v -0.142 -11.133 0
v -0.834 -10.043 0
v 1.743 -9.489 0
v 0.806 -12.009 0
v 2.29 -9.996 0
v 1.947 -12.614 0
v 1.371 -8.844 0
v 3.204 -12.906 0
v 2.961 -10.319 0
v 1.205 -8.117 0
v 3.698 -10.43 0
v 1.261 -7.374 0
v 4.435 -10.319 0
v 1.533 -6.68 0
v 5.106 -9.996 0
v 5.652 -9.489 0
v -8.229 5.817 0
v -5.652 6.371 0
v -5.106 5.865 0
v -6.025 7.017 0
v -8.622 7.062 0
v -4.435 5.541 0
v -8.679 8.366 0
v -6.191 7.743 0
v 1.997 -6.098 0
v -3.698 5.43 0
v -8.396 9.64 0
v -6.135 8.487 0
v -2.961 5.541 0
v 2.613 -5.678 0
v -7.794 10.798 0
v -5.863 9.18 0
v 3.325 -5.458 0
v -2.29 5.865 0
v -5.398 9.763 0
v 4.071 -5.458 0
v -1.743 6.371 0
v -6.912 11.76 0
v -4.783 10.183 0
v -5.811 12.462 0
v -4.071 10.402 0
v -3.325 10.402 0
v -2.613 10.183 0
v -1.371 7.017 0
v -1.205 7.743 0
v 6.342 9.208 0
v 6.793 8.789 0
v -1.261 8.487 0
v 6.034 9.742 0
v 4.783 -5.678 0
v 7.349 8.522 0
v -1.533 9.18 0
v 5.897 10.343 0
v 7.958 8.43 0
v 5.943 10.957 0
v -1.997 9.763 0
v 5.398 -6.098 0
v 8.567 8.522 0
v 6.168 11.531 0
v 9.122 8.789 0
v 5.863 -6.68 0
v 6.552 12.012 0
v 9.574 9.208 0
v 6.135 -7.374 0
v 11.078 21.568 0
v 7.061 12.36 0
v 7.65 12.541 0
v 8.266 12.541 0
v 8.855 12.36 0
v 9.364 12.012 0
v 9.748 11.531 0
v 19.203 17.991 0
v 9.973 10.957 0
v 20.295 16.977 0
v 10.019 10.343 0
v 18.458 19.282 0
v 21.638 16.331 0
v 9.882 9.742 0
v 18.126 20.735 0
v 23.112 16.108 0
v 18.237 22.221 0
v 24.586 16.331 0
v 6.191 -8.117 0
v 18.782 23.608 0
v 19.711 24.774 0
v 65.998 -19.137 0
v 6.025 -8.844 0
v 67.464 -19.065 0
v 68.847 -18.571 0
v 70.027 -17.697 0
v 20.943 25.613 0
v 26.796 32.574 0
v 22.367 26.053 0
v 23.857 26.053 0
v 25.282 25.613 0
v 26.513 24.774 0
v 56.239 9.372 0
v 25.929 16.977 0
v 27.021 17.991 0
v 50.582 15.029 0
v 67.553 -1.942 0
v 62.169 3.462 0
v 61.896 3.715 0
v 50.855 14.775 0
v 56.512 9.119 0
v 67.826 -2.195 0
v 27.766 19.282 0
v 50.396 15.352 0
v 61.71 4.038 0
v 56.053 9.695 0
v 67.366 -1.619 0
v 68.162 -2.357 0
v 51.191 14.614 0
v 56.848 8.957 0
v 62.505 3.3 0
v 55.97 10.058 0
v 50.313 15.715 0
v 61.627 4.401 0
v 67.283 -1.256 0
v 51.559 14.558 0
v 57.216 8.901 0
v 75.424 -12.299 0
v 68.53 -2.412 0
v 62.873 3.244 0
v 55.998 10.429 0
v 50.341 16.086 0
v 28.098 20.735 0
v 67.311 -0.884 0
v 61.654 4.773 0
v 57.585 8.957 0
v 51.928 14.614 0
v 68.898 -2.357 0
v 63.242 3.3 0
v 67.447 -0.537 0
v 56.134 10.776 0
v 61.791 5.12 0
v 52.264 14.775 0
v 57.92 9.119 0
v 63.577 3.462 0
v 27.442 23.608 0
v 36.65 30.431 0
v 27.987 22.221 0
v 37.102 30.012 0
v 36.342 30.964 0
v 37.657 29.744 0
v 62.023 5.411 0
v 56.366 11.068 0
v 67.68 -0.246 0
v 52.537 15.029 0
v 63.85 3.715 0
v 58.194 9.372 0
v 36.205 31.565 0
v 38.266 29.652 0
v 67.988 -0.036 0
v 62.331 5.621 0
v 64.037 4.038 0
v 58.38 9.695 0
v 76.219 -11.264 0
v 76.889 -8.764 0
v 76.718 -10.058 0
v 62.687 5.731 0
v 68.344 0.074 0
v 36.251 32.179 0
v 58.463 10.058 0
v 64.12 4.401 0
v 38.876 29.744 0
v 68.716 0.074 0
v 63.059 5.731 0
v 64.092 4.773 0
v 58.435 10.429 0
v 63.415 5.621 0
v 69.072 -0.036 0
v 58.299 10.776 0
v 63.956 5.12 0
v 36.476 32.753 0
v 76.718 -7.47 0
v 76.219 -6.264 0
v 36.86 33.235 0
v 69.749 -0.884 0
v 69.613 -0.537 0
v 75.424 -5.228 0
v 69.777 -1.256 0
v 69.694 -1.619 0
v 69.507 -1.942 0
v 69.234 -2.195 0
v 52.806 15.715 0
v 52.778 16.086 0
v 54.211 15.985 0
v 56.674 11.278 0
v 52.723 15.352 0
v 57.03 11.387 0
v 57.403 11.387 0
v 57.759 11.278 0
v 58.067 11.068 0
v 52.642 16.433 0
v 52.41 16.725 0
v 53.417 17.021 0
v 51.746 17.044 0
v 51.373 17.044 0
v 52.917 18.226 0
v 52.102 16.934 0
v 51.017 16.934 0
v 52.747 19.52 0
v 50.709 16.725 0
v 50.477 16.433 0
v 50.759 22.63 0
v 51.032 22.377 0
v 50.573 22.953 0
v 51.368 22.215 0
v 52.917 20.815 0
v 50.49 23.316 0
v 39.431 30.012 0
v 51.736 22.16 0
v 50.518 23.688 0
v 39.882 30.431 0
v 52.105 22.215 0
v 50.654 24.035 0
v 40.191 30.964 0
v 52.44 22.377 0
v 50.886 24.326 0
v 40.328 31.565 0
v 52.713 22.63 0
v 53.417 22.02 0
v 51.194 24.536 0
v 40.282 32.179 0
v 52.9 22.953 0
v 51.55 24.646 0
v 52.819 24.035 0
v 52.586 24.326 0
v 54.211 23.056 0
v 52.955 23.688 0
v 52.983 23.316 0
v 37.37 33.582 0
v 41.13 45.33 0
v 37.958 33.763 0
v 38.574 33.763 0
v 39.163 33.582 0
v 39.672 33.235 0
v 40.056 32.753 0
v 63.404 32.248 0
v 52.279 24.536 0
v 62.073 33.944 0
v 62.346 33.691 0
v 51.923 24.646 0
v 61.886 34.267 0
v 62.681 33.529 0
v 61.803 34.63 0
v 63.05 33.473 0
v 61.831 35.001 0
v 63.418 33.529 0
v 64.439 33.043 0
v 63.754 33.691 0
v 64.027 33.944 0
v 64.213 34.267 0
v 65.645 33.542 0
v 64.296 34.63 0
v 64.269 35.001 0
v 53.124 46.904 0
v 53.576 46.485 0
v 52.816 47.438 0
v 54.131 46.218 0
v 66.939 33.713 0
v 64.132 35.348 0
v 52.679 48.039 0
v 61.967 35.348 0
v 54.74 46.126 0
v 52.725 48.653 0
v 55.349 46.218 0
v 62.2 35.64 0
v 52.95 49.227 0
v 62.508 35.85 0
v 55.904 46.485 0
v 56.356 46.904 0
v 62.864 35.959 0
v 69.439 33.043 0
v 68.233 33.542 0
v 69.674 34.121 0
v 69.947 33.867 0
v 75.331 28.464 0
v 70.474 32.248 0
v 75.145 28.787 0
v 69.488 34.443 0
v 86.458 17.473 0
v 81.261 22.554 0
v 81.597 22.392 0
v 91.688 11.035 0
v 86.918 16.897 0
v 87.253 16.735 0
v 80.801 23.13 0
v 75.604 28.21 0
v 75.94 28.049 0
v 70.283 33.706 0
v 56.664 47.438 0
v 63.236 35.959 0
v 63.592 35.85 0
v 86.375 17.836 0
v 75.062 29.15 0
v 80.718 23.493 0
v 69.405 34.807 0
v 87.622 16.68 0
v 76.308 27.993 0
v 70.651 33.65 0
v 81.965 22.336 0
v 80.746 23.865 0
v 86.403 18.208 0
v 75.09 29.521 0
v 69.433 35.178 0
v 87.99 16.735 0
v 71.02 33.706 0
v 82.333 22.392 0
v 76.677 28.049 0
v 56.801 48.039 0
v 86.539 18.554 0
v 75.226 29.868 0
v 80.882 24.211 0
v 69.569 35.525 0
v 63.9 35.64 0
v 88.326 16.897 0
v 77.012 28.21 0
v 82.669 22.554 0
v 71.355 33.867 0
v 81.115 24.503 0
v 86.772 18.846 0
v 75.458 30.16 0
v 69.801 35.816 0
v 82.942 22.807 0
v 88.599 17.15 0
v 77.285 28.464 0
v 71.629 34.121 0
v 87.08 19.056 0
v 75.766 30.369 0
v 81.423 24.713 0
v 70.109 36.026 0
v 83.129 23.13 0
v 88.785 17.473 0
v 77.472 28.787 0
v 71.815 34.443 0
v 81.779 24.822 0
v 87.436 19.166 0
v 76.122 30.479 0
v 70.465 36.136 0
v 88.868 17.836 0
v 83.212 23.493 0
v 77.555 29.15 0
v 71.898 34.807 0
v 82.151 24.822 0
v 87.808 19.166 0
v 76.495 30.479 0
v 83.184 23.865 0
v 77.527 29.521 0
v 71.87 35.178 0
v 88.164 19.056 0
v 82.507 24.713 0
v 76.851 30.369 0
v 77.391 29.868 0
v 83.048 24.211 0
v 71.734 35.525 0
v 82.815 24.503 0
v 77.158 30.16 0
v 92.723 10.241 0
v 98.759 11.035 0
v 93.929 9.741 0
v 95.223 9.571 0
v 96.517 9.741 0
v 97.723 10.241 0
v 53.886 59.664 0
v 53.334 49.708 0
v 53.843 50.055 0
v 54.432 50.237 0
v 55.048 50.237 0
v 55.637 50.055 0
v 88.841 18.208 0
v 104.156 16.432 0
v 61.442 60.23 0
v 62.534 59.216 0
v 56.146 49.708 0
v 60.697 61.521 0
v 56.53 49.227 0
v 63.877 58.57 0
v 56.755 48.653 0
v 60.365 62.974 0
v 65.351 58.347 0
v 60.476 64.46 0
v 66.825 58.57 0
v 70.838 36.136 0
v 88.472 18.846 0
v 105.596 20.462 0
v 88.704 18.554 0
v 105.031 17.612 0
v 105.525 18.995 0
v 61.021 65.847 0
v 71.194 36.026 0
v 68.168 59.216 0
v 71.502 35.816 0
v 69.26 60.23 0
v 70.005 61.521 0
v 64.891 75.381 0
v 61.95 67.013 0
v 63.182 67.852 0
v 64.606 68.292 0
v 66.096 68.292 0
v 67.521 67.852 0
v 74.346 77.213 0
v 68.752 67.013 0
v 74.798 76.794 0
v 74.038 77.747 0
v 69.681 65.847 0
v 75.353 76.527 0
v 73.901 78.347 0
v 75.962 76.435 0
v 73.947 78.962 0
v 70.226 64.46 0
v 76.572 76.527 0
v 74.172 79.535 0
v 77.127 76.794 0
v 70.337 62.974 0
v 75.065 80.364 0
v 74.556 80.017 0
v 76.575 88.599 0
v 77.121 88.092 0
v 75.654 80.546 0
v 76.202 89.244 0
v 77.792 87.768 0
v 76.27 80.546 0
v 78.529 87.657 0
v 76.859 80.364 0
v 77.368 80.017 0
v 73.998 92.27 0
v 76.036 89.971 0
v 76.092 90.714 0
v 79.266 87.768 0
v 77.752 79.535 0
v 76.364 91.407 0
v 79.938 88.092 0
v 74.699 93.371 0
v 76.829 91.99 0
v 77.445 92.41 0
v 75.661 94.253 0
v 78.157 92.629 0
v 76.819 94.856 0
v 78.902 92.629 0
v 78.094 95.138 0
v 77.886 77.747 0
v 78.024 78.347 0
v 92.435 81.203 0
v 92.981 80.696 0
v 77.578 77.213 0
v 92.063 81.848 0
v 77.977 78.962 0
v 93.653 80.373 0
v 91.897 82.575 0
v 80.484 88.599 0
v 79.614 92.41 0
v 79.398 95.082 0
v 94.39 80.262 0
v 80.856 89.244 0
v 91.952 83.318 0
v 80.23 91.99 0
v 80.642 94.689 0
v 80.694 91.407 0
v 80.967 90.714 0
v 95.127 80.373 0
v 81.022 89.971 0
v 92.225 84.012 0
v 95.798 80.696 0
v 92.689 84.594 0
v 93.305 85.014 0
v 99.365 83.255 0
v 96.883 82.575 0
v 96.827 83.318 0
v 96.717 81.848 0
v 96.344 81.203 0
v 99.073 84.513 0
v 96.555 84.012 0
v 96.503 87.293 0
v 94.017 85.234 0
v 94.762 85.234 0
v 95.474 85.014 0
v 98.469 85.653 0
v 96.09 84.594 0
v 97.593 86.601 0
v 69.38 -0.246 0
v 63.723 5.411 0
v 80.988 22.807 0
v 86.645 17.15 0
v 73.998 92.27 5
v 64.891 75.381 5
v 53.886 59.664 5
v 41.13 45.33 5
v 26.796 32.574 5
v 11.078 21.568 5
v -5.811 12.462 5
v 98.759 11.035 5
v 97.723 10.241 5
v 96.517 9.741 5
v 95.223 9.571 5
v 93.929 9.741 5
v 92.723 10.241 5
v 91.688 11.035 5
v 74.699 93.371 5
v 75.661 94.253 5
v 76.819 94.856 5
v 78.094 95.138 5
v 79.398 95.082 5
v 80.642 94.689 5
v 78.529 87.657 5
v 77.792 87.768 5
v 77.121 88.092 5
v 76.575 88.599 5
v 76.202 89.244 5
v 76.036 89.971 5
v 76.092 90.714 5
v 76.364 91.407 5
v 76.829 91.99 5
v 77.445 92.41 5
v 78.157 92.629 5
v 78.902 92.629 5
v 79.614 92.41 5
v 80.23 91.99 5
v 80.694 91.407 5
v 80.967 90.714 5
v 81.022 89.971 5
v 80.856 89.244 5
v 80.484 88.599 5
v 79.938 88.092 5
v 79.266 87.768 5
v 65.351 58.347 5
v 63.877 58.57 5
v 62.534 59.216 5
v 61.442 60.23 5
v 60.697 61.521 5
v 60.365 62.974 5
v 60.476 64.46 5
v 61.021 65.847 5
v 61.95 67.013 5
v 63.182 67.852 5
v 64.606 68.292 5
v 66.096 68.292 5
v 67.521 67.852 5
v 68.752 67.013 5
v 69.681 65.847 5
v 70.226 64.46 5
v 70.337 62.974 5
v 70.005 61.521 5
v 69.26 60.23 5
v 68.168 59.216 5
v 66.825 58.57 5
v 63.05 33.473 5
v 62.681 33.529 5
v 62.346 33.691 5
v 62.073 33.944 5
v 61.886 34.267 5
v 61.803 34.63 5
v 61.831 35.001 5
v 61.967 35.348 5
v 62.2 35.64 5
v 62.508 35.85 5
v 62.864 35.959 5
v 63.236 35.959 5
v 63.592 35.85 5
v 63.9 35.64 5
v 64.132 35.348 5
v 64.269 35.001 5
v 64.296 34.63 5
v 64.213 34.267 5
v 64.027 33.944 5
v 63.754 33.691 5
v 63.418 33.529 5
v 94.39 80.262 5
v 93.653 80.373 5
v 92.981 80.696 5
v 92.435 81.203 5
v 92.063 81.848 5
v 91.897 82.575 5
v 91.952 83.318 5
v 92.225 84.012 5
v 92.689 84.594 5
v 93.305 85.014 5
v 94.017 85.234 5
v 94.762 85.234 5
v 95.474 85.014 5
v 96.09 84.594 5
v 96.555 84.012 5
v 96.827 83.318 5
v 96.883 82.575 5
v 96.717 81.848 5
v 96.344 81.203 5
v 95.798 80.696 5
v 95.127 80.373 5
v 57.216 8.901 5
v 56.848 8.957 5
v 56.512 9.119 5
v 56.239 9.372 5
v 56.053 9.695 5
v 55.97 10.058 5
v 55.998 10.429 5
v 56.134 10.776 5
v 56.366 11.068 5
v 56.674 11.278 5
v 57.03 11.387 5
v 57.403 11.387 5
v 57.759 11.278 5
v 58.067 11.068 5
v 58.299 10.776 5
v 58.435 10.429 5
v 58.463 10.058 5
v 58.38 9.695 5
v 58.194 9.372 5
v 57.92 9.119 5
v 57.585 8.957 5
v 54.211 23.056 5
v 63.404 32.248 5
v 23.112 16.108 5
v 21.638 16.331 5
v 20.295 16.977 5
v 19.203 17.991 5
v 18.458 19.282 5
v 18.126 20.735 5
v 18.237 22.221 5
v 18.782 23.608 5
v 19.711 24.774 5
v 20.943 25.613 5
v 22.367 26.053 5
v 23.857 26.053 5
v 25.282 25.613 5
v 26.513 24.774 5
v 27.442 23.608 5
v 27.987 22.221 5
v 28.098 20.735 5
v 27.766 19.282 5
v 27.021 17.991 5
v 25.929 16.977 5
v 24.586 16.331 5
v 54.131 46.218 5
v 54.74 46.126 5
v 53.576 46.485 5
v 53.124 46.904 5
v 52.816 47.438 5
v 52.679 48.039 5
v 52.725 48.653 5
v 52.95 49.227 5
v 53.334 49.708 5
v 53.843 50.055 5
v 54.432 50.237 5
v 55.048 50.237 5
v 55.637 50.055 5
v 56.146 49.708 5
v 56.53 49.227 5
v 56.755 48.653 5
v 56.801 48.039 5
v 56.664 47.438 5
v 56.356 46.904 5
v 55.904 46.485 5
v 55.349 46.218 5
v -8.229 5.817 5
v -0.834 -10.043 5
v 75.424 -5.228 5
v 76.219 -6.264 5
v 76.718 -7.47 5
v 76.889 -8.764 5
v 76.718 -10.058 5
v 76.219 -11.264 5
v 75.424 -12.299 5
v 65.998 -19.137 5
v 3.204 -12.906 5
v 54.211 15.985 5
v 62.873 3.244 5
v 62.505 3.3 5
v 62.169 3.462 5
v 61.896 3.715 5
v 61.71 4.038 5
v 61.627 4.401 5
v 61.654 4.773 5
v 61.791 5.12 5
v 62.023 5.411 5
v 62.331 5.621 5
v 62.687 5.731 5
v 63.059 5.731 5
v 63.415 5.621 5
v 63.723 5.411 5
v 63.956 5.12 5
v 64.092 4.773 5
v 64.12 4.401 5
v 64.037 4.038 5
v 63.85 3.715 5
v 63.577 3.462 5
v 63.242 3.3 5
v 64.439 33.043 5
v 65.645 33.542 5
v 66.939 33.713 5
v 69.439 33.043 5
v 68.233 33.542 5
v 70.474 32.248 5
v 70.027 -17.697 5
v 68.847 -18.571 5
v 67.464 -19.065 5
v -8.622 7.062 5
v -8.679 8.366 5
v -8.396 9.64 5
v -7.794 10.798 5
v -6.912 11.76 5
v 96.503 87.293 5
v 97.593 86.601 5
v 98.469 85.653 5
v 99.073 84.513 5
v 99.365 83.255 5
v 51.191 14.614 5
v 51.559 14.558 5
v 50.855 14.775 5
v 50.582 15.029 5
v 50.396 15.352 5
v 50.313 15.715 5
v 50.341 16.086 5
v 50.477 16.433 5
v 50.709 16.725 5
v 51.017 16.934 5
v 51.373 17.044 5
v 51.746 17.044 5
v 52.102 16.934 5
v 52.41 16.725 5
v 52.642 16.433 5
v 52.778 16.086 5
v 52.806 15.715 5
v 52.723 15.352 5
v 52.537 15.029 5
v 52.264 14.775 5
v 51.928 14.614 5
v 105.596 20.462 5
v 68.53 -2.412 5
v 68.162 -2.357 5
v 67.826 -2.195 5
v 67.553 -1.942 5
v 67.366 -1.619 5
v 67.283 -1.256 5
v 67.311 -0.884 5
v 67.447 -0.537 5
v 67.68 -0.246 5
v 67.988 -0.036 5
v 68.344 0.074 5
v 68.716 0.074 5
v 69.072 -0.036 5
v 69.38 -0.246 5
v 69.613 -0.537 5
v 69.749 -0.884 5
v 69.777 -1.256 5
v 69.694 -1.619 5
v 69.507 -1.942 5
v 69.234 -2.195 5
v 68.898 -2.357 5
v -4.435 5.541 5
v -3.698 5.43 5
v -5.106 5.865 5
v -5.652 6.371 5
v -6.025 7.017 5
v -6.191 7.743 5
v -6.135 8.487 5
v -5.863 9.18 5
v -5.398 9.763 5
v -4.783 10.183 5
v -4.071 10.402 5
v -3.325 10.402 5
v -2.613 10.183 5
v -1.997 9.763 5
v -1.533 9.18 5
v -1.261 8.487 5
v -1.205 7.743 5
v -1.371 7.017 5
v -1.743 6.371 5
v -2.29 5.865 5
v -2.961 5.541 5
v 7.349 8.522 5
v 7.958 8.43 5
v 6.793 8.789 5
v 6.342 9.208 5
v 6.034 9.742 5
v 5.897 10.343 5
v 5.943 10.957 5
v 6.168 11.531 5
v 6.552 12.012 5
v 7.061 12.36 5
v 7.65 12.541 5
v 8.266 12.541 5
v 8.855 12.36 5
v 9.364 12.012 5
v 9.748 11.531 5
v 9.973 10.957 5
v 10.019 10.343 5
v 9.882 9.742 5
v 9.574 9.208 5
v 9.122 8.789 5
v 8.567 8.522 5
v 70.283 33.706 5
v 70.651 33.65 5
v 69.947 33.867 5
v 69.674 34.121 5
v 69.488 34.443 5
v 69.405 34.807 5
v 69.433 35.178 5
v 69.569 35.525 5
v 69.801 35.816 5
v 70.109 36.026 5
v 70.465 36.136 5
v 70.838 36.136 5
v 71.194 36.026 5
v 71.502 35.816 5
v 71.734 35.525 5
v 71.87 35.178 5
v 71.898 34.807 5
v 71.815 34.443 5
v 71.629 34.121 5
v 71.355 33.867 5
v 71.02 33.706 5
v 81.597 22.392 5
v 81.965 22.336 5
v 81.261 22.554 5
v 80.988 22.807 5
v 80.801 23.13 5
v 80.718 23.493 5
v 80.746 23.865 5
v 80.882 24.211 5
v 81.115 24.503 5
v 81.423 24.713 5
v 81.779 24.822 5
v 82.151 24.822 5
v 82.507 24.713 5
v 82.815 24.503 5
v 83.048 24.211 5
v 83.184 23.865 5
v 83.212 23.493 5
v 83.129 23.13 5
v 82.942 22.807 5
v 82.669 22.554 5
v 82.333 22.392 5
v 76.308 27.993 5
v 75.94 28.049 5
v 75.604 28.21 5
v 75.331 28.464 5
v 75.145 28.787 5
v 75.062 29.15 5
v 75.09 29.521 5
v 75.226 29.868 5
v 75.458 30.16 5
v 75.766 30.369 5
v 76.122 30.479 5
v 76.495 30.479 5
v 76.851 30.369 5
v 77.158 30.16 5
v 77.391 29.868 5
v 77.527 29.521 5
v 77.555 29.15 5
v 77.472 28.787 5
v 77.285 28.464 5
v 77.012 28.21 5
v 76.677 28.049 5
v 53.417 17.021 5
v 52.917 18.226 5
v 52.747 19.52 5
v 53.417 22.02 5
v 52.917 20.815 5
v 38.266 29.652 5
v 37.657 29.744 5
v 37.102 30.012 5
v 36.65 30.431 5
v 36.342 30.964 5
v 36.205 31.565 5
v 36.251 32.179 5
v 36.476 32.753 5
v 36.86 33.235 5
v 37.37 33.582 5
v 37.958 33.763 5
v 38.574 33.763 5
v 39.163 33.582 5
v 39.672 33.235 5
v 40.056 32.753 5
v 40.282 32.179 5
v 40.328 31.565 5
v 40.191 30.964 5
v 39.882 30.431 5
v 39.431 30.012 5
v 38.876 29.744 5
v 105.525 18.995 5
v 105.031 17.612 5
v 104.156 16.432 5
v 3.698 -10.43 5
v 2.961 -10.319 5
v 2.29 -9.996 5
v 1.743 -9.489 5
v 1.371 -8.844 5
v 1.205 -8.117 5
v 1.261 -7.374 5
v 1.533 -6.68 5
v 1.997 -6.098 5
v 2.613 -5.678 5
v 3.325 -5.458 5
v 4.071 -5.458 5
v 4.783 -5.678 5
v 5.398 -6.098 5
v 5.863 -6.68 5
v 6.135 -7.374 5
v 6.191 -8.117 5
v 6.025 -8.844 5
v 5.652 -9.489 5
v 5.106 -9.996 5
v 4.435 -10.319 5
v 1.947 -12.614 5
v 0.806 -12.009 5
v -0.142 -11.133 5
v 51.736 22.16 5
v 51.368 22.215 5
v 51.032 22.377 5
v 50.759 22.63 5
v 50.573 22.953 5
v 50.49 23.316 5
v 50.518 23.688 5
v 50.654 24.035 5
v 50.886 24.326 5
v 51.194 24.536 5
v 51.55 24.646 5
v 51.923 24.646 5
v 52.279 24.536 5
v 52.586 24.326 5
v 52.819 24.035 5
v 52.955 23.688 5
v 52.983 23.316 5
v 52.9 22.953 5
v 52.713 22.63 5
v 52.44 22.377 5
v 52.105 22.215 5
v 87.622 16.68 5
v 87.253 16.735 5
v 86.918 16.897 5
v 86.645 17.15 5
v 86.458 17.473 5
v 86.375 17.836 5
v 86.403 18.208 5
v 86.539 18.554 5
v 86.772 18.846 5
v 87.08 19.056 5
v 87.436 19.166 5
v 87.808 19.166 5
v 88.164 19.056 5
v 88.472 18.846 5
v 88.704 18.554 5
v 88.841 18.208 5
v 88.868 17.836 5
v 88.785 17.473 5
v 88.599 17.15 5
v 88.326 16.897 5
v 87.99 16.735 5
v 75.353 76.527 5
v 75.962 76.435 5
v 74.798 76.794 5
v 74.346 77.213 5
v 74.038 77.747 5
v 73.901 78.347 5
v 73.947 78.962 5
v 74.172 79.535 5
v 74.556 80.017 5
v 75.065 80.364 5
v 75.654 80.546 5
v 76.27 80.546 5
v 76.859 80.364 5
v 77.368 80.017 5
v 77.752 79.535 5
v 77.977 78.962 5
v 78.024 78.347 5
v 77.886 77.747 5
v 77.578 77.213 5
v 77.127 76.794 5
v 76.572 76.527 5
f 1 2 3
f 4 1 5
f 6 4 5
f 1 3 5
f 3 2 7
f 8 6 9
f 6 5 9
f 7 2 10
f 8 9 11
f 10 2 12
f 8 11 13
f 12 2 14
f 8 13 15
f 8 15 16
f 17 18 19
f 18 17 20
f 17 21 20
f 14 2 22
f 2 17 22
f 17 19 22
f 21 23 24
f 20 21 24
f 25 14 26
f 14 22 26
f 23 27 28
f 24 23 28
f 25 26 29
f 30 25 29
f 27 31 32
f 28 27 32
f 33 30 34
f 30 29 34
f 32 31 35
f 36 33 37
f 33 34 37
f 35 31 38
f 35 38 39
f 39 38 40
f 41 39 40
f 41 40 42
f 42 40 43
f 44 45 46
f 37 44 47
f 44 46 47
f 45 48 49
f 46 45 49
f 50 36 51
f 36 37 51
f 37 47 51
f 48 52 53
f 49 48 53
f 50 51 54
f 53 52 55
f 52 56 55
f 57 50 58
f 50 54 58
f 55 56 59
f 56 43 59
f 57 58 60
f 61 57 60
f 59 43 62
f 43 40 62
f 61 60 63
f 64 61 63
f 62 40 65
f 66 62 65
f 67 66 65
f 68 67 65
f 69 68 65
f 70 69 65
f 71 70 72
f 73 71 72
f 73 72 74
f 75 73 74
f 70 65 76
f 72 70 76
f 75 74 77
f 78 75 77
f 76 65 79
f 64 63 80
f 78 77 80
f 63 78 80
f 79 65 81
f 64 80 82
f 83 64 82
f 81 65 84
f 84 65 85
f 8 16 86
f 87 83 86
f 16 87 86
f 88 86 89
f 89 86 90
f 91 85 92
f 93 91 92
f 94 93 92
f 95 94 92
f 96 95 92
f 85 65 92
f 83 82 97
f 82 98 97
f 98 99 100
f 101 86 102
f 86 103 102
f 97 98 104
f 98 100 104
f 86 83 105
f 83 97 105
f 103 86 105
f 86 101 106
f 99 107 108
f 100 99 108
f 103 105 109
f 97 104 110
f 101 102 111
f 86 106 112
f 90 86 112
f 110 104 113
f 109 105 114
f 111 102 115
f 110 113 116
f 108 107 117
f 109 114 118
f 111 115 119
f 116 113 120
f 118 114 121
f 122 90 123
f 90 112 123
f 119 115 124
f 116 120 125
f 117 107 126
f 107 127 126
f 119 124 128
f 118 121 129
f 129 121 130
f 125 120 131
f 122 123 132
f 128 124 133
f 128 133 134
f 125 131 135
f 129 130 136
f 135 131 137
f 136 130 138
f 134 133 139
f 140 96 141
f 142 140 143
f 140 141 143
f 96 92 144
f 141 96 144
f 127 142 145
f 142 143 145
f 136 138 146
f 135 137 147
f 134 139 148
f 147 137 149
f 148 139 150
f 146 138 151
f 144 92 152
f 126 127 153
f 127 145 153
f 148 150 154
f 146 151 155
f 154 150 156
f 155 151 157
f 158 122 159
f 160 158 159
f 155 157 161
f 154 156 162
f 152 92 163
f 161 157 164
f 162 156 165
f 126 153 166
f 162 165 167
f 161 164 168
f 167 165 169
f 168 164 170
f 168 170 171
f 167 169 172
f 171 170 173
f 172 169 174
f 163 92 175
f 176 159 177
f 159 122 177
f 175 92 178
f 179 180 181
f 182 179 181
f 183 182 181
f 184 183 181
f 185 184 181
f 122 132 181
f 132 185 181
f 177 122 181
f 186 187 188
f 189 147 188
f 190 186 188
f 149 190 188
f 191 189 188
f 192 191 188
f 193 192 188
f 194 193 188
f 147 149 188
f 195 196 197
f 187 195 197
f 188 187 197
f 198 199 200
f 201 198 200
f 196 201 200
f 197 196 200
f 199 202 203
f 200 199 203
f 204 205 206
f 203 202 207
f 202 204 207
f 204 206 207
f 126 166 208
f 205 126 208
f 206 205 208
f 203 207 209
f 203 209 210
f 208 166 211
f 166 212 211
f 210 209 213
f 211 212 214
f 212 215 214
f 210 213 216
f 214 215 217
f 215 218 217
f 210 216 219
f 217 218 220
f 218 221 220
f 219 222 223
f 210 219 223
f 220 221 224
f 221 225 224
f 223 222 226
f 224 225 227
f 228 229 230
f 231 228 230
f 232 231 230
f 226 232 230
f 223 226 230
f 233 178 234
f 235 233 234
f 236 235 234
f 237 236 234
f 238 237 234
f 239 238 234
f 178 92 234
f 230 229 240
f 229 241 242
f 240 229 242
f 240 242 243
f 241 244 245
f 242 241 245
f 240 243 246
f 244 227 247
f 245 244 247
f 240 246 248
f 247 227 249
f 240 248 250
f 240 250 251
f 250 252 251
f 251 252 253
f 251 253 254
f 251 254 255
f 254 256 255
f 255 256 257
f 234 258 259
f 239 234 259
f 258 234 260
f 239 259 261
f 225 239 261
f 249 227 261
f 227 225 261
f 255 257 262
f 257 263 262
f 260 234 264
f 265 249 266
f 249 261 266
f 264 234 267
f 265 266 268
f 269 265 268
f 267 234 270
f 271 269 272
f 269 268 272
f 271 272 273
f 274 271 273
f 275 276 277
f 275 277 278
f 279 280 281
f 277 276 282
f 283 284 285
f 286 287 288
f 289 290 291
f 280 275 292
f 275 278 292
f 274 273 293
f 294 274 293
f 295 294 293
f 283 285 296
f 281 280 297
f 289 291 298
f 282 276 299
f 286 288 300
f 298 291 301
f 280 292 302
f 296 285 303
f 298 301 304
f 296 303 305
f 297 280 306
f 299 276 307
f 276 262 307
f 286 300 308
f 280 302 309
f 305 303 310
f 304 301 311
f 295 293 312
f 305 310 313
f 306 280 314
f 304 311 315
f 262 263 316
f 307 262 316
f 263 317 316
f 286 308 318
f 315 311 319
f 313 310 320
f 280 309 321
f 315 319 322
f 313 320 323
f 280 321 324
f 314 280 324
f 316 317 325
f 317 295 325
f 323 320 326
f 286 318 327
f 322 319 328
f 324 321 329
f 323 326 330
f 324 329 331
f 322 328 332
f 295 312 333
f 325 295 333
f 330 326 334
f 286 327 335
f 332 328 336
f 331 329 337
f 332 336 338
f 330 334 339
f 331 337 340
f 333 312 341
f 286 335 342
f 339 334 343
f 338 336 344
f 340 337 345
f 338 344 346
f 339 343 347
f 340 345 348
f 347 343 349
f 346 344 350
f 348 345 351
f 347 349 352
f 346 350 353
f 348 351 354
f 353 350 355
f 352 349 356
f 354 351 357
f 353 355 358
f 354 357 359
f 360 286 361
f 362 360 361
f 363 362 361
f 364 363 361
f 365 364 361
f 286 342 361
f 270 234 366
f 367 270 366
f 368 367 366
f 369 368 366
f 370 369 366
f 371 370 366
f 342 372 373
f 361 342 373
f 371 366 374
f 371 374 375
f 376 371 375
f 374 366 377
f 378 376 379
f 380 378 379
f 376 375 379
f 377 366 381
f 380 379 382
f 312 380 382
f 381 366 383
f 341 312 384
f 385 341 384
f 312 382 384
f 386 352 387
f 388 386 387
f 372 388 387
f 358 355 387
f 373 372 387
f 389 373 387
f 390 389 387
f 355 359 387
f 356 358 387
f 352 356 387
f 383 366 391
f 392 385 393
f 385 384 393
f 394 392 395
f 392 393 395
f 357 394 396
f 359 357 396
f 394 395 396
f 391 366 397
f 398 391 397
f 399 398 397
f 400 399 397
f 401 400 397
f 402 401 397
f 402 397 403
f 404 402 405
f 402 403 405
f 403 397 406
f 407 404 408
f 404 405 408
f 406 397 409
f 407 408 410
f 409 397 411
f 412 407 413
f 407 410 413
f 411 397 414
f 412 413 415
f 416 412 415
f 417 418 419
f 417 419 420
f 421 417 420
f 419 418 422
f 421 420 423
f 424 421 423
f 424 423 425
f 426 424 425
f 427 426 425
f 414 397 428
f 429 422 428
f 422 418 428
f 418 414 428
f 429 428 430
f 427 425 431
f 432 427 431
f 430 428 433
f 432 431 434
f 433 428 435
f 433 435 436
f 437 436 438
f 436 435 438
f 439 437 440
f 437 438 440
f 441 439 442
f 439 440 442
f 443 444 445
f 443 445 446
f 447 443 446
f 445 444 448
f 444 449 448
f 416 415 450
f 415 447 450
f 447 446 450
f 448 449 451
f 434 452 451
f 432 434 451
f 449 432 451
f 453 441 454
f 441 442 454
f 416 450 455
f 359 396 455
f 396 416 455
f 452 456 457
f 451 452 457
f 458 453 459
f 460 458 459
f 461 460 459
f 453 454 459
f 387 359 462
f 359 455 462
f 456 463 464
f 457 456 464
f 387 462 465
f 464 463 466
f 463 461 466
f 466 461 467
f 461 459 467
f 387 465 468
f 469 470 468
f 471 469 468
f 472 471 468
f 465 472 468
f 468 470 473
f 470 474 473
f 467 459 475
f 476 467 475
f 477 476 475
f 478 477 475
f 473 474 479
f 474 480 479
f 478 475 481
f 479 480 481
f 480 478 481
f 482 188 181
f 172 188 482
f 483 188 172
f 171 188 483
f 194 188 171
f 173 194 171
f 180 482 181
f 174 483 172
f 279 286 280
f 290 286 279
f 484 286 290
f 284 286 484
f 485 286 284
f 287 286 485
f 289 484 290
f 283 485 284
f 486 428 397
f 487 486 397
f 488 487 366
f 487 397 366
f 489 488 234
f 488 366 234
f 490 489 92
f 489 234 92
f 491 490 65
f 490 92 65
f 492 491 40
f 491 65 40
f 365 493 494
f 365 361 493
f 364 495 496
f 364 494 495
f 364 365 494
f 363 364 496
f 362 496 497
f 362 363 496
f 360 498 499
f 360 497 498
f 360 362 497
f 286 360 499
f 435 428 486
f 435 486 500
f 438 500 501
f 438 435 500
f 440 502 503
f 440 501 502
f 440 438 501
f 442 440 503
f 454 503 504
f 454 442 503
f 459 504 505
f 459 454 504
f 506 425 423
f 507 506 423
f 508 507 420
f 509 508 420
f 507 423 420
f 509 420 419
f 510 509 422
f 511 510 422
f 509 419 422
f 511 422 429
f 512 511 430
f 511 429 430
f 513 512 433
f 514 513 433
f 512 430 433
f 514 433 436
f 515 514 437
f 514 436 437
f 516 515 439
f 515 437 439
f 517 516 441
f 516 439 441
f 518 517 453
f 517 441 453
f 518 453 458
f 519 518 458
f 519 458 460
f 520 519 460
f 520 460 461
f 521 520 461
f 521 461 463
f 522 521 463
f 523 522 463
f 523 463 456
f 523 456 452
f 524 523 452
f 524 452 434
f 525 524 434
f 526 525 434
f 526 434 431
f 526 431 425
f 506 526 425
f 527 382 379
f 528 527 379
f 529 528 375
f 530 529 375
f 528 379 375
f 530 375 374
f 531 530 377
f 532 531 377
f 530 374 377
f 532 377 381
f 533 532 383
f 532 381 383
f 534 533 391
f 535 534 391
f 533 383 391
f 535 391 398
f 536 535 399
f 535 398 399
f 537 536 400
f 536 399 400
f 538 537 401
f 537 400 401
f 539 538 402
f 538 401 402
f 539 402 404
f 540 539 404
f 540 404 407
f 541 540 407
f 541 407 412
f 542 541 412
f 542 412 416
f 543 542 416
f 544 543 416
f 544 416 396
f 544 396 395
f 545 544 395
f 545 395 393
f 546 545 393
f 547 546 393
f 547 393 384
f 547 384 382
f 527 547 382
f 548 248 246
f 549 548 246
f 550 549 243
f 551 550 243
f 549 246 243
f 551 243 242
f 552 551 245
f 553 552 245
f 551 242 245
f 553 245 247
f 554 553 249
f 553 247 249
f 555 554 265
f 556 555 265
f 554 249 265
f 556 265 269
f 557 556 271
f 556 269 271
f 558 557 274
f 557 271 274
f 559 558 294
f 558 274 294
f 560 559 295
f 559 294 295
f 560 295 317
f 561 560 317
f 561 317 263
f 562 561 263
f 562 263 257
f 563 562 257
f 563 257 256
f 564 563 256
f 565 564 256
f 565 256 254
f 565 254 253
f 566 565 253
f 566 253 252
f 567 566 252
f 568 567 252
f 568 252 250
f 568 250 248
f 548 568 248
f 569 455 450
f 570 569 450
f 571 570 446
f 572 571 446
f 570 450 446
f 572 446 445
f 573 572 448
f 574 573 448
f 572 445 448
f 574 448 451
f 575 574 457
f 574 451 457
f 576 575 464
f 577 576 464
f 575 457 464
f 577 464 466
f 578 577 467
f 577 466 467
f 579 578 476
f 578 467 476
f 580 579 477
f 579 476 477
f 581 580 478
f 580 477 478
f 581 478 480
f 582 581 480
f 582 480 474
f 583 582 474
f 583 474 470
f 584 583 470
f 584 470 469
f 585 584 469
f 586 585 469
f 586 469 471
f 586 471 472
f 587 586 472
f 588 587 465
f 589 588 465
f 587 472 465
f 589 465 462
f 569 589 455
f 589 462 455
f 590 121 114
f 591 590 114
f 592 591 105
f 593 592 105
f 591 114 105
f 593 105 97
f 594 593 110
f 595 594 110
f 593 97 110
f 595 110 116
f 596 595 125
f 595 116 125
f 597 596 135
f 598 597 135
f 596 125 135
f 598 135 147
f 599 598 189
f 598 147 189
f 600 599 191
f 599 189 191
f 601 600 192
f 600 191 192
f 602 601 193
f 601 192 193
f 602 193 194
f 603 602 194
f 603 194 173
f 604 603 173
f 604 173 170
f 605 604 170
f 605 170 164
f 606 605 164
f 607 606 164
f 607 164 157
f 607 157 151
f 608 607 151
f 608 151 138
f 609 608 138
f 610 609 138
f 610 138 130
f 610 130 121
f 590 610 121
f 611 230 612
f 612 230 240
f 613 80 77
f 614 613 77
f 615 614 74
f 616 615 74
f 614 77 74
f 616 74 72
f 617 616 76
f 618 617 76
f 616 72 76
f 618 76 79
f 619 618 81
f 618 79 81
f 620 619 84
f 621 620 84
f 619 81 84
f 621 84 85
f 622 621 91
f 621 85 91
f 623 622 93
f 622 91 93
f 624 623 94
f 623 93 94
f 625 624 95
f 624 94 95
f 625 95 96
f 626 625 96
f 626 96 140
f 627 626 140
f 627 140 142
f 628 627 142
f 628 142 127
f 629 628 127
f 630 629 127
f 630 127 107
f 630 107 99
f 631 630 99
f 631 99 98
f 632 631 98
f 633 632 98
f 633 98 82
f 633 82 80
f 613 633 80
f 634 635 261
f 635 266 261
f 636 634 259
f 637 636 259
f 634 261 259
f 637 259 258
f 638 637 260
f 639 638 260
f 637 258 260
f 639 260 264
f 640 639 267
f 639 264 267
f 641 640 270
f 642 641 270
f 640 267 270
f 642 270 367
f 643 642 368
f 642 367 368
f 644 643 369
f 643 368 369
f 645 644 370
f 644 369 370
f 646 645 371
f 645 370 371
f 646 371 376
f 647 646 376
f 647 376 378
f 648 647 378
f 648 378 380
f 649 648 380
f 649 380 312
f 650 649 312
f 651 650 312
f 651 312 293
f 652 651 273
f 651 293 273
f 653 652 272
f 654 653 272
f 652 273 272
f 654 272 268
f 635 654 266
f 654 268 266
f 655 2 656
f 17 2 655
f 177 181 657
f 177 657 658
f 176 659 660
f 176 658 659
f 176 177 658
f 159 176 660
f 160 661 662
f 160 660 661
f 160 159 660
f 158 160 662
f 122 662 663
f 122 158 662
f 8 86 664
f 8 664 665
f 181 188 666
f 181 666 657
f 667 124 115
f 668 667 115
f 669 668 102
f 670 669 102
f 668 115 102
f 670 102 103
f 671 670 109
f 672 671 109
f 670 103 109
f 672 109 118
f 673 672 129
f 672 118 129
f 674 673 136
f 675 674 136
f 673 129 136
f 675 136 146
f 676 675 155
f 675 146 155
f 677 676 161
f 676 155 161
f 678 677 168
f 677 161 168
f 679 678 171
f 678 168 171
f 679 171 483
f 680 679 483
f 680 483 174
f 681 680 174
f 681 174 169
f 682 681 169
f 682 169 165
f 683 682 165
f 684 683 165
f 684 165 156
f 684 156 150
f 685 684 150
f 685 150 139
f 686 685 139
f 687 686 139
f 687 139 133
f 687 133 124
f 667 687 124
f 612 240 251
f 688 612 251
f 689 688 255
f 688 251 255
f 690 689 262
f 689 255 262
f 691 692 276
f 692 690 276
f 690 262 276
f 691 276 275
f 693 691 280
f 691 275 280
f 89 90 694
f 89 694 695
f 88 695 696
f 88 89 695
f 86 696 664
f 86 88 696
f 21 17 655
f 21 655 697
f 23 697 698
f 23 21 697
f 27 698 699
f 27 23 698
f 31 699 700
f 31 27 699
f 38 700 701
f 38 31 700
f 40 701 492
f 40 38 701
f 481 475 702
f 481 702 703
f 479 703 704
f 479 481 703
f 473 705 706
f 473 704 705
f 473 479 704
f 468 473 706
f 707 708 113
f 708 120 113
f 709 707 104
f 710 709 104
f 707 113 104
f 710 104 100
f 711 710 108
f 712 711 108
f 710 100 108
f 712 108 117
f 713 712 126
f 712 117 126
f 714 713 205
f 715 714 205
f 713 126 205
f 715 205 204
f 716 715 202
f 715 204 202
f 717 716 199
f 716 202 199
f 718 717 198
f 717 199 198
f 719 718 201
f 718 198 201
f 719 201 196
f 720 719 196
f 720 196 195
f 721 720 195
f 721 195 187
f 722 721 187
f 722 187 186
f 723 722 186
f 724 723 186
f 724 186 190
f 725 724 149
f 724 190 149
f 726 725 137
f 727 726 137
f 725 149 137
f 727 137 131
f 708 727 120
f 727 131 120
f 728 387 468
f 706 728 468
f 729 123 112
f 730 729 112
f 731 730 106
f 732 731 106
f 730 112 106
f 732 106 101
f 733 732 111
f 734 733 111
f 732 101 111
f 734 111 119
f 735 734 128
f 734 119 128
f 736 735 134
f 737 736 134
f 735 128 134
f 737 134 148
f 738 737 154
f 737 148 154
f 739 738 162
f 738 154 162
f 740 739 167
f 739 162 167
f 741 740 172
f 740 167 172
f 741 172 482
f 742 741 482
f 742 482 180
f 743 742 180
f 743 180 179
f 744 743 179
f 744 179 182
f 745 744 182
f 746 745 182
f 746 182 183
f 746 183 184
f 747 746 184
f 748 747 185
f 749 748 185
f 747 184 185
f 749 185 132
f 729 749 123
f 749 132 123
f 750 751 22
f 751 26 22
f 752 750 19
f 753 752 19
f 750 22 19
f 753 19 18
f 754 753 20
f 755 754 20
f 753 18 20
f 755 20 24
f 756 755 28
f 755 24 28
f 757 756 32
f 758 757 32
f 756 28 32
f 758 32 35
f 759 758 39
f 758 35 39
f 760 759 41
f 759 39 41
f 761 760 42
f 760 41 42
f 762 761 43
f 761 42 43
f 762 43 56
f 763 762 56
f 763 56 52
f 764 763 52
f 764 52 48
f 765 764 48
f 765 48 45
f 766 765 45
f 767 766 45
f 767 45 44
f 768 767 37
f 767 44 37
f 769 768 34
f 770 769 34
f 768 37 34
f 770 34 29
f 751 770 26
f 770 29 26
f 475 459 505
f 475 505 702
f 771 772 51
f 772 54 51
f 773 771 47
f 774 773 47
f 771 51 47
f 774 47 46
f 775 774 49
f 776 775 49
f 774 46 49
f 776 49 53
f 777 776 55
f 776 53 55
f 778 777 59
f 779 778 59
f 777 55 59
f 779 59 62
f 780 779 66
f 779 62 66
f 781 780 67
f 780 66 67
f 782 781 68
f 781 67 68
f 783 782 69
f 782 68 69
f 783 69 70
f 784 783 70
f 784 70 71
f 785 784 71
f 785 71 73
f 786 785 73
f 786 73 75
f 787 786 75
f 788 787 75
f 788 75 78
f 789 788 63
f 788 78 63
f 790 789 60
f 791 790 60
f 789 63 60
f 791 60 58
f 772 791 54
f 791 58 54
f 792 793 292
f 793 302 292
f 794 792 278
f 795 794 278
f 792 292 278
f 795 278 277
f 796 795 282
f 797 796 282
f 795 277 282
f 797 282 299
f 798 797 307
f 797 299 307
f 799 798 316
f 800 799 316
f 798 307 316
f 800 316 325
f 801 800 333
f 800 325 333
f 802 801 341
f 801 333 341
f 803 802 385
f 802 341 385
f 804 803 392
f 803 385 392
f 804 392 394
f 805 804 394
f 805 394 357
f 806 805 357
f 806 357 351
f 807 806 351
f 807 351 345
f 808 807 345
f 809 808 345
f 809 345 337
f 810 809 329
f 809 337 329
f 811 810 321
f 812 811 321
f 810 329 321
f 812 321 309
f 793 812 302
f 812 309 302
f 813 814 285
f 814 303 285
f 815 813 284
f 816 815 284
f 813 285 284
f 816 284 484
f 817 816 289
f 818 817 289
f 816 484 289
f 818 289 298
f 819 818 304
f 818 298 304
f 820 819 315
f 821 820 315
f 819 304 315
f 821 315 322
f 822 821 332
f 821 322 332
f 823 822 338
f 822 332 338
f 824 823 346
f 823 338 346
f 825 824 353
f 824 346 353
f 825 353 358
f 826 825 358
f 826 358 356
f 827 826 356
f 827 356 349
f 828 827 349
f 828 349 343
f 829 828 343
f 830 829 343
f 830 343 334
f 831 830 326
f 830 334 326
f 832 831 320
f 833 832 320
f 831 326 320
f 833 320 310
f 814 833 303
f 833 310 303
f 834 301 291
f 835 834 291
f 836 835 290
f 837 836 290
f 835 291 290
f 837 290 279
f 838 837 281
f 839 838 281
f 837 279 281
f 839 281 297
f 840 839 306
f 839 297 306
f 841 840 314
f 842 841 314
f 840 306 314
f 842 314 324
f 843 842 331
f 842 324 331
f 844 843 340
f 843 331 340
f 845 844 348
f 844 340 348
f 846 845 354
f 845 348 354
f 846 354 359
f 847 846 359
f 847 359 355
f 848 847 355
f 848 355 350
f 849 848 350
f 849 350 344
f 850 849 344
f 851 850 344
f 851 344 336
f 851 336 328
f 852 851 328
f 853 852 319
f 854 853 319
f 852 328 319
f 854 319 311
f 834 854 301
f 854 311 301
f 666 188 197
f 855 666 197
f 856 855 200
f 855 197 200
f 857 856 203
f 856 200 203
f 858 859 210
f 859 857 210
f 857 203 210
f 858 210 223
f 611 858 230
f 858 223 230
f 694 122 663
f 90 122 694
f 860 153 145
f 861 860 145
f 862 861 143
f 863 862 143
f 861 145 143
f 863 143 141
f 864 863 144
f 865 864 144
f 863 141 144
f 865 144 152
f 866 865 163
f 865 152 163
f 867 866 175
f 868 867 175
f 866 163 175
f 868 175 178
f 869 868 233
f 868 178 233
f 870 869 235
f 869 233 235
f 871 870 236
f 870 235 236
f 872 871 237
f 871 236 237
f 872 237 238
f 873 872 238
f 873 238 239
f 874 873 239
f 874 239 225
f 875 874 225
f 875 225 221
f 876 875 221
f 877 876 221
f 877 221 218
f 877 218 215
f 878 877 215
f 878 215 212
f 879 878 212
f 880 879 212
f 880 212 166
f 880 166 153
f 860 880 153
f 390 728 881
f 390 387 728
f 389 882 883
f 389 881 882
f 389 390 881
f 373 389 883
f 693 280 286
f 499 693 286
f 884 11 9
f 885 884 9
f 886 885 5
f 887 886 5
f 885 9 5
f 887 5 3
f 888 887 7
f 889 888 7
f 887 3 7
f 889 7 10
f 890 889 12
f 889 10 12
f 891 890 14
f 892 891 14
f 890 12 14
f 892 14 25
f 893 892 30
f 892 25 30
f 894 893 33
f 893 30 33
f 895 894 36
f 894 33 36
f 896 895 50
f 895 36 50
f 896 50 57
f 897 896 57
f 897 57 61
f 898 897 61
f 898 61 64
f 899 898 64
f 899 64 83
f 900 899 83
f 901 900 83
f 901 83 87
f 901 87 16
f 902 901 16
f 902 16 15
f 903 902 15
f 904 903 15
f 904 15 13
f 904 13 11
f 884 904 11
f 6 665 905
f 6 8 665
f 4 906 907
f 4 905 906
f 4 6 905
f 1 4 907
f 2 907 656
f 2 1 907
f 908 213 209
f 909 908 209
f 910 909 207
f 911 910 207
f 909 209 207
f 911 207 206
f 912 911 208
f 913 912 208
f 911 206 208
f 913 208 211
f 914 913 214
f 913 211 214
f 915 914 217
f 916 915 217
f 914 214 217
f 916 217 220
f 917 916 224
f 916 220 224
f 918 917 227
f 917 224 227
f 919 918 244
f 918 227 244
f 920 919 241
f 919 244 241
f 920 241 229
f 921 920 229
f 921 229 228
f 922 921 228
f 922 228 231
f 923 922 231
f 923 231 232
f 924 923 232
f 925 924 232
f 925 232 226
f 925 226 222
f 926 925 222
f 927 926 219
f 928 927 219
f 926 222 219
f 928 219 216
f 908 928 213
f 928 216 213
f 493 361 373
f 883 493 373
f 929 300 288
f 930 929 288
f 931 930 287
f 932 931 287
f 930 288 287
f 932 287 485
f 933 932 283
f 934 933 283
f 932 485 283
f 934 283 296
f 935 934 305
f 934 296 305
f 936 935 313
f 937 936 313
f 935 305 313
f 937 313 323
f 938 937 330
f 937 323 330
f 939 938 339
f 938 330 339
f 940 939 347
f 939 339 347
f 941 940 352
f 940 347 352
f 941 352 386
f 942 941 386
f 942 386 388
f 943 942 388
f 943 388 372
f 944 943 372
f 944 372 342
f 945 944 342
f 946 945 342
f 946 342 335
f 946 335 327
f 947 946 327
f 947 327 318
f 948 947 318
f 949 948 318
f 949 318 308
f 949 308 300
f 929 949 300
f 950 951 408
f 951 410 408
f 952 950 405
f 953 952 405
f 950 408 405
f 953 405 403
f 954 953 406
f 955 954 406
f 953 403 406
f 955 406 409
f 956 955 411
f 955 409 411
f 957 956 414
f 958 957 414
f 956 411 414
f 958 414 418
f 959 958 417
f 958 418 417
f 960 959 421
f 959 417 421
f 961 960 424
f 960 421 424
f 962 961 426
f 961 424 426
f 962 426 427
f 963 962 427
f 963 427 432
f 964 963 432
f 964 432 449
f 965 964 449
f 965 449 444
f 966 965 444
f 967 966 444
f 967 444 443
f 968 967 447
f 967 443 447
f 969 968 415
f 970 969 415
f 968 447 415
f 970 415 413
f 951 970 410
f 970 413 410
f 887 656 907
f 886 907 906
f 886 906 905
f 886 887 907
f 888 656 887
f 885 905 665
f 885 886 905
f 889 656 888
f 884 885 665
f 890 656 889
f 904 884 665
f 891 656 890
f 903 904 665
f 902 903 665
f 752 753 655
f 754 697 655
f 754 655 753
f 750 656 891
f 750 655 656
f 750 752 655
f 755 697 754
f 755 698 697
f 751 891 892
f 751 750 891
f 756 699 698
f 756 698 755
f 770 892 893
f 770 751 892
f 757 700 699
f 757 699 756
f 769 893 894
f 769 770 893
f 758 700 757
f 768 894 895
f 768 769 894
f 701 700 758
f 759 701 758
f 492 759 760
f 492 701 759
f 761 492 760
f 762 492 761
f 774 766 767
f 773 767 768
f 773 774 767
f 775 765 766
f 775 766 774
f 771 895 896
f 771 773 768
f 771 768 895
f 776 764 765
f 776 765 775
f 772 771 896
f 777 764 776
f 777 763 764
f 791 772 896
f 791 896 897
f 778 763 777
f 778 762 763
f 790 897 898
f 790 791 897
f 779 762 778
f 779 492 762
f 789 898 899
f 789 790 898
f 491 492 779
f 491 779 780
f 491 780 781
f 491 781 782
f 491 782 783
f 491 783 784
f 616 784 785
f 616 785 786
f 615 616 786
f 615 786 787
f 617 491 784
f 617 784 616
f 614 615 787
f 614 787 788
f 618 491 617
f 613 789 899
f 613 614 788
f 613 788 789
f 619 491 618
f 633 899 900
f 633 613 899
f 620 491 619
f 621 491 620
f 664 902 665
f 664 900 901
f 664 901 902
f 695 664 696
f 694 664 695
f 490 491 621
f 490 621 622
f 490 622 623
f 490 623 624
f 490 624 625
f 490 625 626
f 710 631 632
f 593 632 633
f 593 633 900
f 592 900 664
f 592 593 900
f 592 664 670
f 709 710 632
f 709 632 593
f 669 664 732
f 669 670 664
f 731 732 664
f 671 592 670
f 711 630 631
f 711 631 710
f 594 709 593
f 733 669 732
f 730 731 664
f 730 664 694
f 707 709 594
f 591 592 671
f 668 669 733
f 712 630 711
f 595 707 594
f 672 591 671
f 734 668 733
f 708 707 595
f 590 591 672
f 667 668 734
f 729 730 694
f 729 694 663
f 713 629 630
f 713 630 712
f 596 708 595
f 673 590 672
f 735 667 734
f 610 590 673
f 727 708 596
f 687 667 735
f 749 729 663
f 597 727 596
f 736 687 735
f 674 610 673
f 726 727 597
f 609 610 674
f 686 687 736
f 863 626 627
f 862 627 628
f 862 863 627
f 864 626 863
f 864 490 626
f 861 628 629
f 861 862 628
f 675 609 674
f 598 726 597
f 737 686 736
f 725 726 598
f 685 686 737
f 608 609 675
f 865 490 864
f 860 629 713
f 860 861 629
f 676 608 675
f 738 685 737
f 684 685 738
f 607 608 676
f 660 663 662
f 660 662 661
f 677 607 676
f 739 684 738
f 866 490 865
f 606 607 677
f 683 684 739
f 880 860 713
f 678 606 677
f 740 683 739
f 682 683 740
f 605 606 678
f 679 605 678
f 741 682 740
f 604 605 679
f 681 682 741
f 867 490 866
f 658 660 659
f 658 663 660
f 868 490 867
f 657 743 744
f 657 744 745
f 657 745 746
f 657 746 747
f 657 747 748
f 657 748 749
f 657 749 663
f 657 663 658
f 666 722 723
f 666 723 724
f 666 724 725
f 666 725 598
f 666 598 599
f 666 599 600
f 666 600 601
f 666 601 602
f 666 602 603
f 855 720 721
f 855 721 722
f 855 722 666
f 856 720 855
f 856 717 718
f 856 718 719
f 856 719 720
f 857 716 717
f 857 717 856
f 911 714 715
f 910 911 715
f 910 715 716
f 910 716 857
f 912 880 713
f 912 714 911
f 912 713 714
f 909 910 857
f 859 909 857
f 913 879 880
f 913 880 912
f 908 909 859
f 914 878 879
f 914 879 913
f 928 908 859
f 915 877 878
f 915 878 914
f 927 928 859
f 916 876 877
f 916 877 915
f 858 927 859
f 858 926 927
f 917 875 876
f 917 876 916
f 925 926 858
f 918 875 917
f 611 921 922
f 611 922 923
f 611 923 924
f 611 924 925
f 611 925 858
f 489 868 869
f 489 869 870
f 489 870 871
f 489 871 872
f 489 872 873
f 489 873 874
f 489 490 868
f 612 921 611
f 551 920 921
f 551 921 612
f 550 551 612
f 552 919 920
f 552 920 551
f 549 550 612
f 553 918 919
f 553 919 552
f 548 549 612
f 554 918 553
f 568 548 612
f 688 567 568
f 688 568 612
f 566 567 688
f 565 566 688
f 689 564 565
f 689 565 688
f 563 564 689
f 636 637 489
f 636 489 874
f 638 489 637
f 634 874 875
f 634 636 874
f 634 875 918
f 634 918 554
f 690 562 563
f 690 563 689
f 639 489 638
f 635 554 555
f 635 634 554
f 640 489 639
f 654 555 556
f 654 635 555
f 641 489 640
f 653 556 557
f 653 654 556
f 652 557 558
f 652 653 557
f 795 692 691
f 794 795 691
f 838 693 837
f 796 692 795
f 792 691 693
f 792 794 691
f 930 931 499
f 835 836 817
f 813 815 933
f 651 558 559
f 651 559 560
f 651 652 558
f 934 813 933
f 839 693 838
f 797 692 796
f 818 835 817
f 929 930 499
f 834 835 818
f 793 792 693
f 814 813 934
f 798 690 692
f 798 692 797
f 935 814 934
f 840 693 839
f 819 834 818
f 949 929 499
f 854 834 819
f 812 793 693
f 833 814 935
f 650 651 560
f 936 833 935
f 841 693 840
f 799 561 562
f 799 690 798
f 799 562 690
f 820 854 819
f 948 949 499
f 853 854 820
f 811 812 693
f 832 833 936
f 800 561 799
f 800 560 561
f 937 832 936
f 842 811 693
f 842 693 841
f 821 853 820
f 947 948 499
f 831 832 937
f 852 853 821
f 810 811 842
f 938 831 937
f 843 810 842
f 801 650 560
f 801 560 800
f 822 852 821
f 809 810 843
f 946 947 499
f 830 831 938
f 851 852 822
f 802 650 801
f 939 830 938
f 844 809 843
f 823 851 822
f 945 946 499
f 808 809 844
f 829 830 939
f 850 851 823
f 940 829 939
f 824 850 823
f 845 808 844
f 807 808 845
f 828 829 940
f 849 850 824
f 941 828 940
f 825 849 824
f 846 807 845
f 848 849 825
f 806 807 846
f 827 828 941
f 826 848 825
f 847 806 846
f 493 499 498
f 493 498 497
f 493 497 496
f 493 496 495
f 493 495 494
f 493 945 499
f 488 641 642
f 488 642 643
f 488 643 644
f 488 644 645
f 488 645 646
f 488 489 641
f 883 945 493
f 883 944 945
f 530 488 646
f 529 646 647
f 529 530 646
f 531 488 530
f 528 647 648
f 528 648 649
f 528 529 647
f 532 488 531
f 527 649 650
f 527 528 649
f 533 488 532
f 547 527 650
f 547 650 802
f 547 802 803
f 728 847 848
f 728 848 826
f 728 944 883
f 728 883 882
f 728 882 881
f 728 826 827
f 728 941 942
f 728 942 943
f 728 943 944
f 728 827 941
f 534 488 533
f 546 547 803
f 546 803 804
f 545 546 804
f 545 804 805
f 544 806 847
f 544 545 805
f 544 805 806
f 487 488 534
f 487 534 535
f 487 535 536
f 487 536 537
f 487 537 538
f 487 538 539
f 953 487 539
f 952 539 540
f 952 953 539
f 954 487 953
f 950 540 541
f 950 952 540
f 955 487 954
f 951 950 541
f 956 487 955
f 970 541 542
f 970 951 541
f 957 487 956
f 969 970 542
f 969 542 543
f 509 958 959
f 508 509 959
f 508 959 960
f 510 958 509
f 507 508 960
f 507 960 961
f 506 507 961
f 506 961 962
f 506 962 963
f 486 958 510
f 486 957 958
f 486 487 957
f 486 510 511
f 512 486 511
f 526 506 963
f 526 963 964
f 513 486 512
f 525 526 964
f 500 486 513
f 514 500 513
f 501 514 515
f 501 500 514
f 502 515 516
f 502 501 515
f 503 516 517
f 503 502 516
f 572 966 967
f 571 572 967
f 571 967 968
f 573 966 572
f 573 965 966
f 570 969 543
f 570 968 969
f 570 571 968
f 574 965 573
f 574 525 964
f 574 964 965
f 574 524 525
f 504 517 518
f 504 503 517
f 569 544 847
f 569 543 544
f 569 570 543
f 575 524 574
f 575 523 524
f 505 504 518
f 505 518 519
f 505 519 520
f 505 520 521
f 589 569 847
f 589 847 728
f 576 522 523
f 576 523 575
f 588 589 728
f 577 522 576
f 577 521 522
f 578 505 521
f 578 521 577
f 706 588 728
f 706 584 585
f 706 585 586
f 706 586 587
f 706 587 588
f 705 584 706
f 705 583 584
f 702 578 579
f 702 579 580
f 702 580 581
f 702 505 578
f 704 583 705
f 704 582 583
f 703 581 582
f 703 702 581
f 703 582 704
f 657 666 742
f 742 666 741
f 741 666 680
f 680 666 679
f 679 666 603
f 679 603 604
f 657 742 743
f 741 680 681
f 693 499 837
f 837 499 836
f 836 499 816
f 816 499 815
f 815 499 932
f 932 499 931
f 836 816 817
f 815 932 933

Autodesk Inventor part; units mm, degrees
ref_plane "YZ Plane" through (0, 0, 0) normal (1, 0, 0) x (0, 1, 0)
ref_plane "XZ Plane" through (0, 0, 0) normal (0, 1, 0) x (-1, 0, 0)
ref_plane "XY Plane" through (0, 0, 0) normal (0, 0, 1) x (1, 0, 0)
sketch "Sketch1" plane through (0, 0, 0) normal (0, 0, 1) x (1, 0, 0)
  circle A0 centre (-3.6979, 7.9302) radius 2.5 construction
  circle A1 centre (3.6979, -7.9302) radius 2.5 construction
  line L0 (-8.2294, 5.8171) -> (-0.8336, -10.0433) construction
  arc A2 (-0.8336, -10.0433) -> (8.2294, -5.8171) centre (3.6979, -7.9302) ccw construction
  line L1 (8.2294, -5.8171) -> (0.8336, 10.0433) construction
  arc A3 (0.8336, 10.0433) -> (-8.2294, 5.8171) centre (-3.6979, 7.9302) ccw construction
  circle A4 centre (78.5293, 90.1574) radius 2.5 construction
  circle A5 centre (94.3897, 82.7616) radius 2.5 construction
  line L2 (76.4162, 85.6259) -> (92.2766, 78.2301) construction
  arc A6 (92.2766, 78.2301) -> (96.5028, 87.2931) centre (94.3897, 82.7616) ccw construction
  line L3 (96.5028, 87.2931) -> (80.6424, 94.689) construction
  arc A7 (80.6424, 94.689) -> (76.4162, 85.6259) centre (78.5293, 90.1574) ccw construction
  circle A8 centre (-75.543, 162.0025) radius 75 construction
  line L4 (112.457, 50.5739) -> (112.457, -27.9975) construction
  line L5 (107.457, -32.9975) -> (39.927, -32.9975) construction
  line L6 (-75.543, 162.0025) -> (58.8073, 27.6522) construction
  line L7 (54.2111, 23.056) -> (63.4035, 32.2484)
  line L8 (70.4745, 32.2484) -> (91.6877, 11.0352)
  line L9 (54.2111, 15.985) -> (75.4243, -5.2282)
  line L10 (75.4243, -12.2993) -> (70.027, -17.6966)
  line L11 (98.7588, 11.0352) -> (104.1561, 16.4325)
  line L12 (-0.8336, -10.0433) -> (-8.2294, 5.8171)
  line L13 (80.6424, 94.689) -> (96.5028, 87.2931)
  arc A9 (-5.811, 12.4617) -> (73.9978, 92.2705) centre (-75.543, 162.0025) ccw
  line L14 (-3.6979, 7.9302) -> (3.6979, -7.9302) construction
  line L15 (78.5293, 90.1574) -> (94.3897, 82.7616) construction
  line L16 (65.9977, -19.1366) -> (3.2042, -12.9058)
  line L17 (105.5961, 20.4618) -> (99.3653, 83.2553)
  arc A10 (75.4243, -12.2993) -> (75.4243, -5.2282) centre (71.8887, -8.7638) ccw
  arc A11 (54.2111, 23.056) -> (54.2111, 15.985) centre (57.7466, 19.5205) ccw
  arc A12 (70.4745, 32.2484) -> (63.4035, 32.2484) centre (66.939, 28.7129) ccw
  arc A13 (91.6877, 11.0352) -> (98.7588, 11.0352) centre (95.2233, 14.5708) ccw
  arc A14 (104.1561, 16.4325) -> (105.5961, 20.4618) centre (100.6206, 19.9681) ccw
  arc A15 (99.3653, 83.2553) -> (96.5028, 87.2931) centre (94.3897, 82.7616) ccw
  arc A16 (80.6424, 94.689) -> (73.9978, 92.2705) centre (78.5293, 90.1574) ccw
  arc A17 (-5.811, 12.4617) -> (-8.2294, 5.8171) centre (-3.6979, 7.9302) ccw
  arc A18 (-0.8336, -10.0433) -> (3.2042, -12.9058) centre (3.6979, -7.9302) ccw
  arc A19 (65.9977, -19.1366) -> (70.027, -17.6966) centre (66.4914, -14.1611) ccw
  point P0 (0, 0)
  point P1 (79.4008, -9.1758)
  point P2 (50.6755, 19.5205)
  point P3 (66.939, 35.784)
  point P4 (95.2233, 7.4997)
  point P5 (78.9598, -8.7638)
  point P6 (68.3532, -19.3704)
  point P7 (105.8299, 18.1063)
  point P8 (0.37, -12.6245)
  point P9 (76.0422, 96.8341)
  point P10 (99.084, 86.0895)
  point P11 (-10.3746, 10.4173)
  point P12 (-4.5315, -2.1131)
  point P13 (88.5726, 90.991)
  dimension "d56" = 190
  dimension "d64" = 23
  dimension "d65" = 40
  dimension "d67" = 165
  dimension "d68" = 15
  dimension "d69" = 15
  dimension "d70" = 20
  dimension "d73" = 5
extrude "Extrusion1" add sketch "Sketch1" along normal blind 5
sketch "Sketch2" plane through (0, 0, 5) normal (0, 0, 1) x (1, 0, 0)
  circle A0 centre (3.6979, -7.9302) radius 2.067 projected
  circle A1 centre (-3.6979, 7.9302) radius 2.067 projected
  circle A2 centre (94.3897, 82.7616) radius 2.067 projected
  circle A3 centre (78.5293, 90.1574) radius 2.067 projected
  point P0 (0, 0)
hole "Hole1" at (78.5293, 90.1574, 5) at (94.3897, 82.7616, 5) at (-3.6979, 7.9302, 5) at (3.6979, -7.9302, 5) direction (0, 0, -1) diameter 5 end through all
sketch "Sketch4" plane through (0, 0, 5) normal (0, 0, 1) x (1, 0, 0)
  circle A0 centre (-3.6979, 7.9302) radius 2.5 projected
  circle A1 centre (78.5293, 90.1574) radius 2.5 projected
  circle A2 centre (94.3897, 82.7616) radius 2.5 projected
  circle A3 centre (3.6979, -7.9302) radius 2.5 projected
  line L0 (-75.543, 162.0025) -> (23.1121, 21.1084) construction
  line L1 (-75.543, 162.0025) -> (-3.6979, 7.9302) construction
  line L2 (78.5293, 90.1574) -> (-75.543, 162.0025) construction
  line L3 (-75.543, 162.0025) -> (65.3511, 63.3474) construction
  circle A4 centre (-75.543, 162.0025) radius 75 projected
  point P0 (0, 0)
  dimension "d27" = 10
  dimension "d28" = 10
  dimension "d71" = 172
  dimension "d72" = 172
hole "Hole2" at (23.1121, 21.1084, 5) at (65.3511, 63.3474, 5) direction (0, 0, -1) diameter 10 end through all
sketch "Sketch6" plane through (0, 0, 5) normal (0, 0, 1) x (1, 0, 0)
  line L0 (23.1121, 21.1084) -> (7.9578, 10.4972) construction
  line L1 (23.1121, 21.1084) -> (38.2664, 31.7195) construction
  line L2 (23.1121, 21.1084) -> (19.0971, 26.8424) construction
  line L3 (65.3511, 63.3474) -> (54.74, 48.1931) construction
  line L4 (65.3511, 63.3474) -> (75.9623, 78.5017) construction
  line L5 (65.3511, 63.3474) -> (59.6171, 67.3624) construction
  arc A0 (-5.811, 12.4617) -> (73.9978, 92.2705) centre (-75.543, 162.0025) ccw projected
  point P0 (0, 0)
  point P1 (76.0422, 96.8341)
  point P2 (-10.3746, 10.4173)
  dimension "d29" = 18.5
  dimension "d30" = 18.5
  dimension "d38" = 18.5
  dimension "d39" = 18.5
hole "Hole3" at (7.9578, 10.4972, 5) at (38.2664, 31.7195, 5) at (54.74, 48.1931, 5) at (75.9623, 78.5017, 5) direction (0, 0, -1) diameter 4.134 end through all thread size "M5x0.8" class "6H" standard "ANSI Metric M Profile"
sketch "Sketch7" plane through (0, 0, 5) normal (0, 0, 1) x (1, 0, 0)
  arc A0 (50.3958, 16.2647) -> (52.016, 14.6445) centre (51.5594, 15.8082) ccw projected
  arc A1 (56.0526, 10.6079) -> (57.6728, 8.9877) centre (57.2163, 10.1513) ccw projected
  arc A2 (61.7095, 4.951) -> (63.3297, 3.3308) centre (62.8731, 4.4945) ccw projected
  arc A3 (67.3663, -0.7058) -> (68.9865, -2.326) centre (68.53, -1.1624) ccw projected
  arc A4 (71.815, 34.4435) -> (70.1948, 36.0637) centre (70.6513, 34.9001) ccw projected
  arc A5 (77.4718, 28.7867) -> (75.8516, 30.4069) centre (76.3082, 29.2432) ccw projected
  arc A6 (83.1287, 23.1298) -> (81.5085, 24.75) centre (81.965, 23.5864) ccw projected
  arc A7 (88.7855, 17.473) -> (87.1653, 19.0932) centre (87.6219, 17.9295) ccw projected
  arc A8 (63.5065, 35.8869) -> (61.8863, 34.2668) centre (63.0499, 34.7233) ccw projected
  arc A9 (52.1927, 24.5732) -> (50.5726, 22.953) centre (51.7362, 23.4096) ccw projected
  point P0 (0, 0)
hole "Hole4" at (51.7362, 23.4096, 5) at (63.0499, 34.7233, 5) at (51.5594, 15.8082, 5) at (57.2163, 10.1513, 5) at (62.8731, 4.4945, 5) at (70.6513, 34.9001, 5) at (76.3082, 29.2432, 5) at (81.965, 23.5864, 5) at (68.53, -1.1624, 5) at (87.6219, 17.9295, 5) direction (0, 0, -1) diameter 2.5 end through all
properties part number "motorplate"
